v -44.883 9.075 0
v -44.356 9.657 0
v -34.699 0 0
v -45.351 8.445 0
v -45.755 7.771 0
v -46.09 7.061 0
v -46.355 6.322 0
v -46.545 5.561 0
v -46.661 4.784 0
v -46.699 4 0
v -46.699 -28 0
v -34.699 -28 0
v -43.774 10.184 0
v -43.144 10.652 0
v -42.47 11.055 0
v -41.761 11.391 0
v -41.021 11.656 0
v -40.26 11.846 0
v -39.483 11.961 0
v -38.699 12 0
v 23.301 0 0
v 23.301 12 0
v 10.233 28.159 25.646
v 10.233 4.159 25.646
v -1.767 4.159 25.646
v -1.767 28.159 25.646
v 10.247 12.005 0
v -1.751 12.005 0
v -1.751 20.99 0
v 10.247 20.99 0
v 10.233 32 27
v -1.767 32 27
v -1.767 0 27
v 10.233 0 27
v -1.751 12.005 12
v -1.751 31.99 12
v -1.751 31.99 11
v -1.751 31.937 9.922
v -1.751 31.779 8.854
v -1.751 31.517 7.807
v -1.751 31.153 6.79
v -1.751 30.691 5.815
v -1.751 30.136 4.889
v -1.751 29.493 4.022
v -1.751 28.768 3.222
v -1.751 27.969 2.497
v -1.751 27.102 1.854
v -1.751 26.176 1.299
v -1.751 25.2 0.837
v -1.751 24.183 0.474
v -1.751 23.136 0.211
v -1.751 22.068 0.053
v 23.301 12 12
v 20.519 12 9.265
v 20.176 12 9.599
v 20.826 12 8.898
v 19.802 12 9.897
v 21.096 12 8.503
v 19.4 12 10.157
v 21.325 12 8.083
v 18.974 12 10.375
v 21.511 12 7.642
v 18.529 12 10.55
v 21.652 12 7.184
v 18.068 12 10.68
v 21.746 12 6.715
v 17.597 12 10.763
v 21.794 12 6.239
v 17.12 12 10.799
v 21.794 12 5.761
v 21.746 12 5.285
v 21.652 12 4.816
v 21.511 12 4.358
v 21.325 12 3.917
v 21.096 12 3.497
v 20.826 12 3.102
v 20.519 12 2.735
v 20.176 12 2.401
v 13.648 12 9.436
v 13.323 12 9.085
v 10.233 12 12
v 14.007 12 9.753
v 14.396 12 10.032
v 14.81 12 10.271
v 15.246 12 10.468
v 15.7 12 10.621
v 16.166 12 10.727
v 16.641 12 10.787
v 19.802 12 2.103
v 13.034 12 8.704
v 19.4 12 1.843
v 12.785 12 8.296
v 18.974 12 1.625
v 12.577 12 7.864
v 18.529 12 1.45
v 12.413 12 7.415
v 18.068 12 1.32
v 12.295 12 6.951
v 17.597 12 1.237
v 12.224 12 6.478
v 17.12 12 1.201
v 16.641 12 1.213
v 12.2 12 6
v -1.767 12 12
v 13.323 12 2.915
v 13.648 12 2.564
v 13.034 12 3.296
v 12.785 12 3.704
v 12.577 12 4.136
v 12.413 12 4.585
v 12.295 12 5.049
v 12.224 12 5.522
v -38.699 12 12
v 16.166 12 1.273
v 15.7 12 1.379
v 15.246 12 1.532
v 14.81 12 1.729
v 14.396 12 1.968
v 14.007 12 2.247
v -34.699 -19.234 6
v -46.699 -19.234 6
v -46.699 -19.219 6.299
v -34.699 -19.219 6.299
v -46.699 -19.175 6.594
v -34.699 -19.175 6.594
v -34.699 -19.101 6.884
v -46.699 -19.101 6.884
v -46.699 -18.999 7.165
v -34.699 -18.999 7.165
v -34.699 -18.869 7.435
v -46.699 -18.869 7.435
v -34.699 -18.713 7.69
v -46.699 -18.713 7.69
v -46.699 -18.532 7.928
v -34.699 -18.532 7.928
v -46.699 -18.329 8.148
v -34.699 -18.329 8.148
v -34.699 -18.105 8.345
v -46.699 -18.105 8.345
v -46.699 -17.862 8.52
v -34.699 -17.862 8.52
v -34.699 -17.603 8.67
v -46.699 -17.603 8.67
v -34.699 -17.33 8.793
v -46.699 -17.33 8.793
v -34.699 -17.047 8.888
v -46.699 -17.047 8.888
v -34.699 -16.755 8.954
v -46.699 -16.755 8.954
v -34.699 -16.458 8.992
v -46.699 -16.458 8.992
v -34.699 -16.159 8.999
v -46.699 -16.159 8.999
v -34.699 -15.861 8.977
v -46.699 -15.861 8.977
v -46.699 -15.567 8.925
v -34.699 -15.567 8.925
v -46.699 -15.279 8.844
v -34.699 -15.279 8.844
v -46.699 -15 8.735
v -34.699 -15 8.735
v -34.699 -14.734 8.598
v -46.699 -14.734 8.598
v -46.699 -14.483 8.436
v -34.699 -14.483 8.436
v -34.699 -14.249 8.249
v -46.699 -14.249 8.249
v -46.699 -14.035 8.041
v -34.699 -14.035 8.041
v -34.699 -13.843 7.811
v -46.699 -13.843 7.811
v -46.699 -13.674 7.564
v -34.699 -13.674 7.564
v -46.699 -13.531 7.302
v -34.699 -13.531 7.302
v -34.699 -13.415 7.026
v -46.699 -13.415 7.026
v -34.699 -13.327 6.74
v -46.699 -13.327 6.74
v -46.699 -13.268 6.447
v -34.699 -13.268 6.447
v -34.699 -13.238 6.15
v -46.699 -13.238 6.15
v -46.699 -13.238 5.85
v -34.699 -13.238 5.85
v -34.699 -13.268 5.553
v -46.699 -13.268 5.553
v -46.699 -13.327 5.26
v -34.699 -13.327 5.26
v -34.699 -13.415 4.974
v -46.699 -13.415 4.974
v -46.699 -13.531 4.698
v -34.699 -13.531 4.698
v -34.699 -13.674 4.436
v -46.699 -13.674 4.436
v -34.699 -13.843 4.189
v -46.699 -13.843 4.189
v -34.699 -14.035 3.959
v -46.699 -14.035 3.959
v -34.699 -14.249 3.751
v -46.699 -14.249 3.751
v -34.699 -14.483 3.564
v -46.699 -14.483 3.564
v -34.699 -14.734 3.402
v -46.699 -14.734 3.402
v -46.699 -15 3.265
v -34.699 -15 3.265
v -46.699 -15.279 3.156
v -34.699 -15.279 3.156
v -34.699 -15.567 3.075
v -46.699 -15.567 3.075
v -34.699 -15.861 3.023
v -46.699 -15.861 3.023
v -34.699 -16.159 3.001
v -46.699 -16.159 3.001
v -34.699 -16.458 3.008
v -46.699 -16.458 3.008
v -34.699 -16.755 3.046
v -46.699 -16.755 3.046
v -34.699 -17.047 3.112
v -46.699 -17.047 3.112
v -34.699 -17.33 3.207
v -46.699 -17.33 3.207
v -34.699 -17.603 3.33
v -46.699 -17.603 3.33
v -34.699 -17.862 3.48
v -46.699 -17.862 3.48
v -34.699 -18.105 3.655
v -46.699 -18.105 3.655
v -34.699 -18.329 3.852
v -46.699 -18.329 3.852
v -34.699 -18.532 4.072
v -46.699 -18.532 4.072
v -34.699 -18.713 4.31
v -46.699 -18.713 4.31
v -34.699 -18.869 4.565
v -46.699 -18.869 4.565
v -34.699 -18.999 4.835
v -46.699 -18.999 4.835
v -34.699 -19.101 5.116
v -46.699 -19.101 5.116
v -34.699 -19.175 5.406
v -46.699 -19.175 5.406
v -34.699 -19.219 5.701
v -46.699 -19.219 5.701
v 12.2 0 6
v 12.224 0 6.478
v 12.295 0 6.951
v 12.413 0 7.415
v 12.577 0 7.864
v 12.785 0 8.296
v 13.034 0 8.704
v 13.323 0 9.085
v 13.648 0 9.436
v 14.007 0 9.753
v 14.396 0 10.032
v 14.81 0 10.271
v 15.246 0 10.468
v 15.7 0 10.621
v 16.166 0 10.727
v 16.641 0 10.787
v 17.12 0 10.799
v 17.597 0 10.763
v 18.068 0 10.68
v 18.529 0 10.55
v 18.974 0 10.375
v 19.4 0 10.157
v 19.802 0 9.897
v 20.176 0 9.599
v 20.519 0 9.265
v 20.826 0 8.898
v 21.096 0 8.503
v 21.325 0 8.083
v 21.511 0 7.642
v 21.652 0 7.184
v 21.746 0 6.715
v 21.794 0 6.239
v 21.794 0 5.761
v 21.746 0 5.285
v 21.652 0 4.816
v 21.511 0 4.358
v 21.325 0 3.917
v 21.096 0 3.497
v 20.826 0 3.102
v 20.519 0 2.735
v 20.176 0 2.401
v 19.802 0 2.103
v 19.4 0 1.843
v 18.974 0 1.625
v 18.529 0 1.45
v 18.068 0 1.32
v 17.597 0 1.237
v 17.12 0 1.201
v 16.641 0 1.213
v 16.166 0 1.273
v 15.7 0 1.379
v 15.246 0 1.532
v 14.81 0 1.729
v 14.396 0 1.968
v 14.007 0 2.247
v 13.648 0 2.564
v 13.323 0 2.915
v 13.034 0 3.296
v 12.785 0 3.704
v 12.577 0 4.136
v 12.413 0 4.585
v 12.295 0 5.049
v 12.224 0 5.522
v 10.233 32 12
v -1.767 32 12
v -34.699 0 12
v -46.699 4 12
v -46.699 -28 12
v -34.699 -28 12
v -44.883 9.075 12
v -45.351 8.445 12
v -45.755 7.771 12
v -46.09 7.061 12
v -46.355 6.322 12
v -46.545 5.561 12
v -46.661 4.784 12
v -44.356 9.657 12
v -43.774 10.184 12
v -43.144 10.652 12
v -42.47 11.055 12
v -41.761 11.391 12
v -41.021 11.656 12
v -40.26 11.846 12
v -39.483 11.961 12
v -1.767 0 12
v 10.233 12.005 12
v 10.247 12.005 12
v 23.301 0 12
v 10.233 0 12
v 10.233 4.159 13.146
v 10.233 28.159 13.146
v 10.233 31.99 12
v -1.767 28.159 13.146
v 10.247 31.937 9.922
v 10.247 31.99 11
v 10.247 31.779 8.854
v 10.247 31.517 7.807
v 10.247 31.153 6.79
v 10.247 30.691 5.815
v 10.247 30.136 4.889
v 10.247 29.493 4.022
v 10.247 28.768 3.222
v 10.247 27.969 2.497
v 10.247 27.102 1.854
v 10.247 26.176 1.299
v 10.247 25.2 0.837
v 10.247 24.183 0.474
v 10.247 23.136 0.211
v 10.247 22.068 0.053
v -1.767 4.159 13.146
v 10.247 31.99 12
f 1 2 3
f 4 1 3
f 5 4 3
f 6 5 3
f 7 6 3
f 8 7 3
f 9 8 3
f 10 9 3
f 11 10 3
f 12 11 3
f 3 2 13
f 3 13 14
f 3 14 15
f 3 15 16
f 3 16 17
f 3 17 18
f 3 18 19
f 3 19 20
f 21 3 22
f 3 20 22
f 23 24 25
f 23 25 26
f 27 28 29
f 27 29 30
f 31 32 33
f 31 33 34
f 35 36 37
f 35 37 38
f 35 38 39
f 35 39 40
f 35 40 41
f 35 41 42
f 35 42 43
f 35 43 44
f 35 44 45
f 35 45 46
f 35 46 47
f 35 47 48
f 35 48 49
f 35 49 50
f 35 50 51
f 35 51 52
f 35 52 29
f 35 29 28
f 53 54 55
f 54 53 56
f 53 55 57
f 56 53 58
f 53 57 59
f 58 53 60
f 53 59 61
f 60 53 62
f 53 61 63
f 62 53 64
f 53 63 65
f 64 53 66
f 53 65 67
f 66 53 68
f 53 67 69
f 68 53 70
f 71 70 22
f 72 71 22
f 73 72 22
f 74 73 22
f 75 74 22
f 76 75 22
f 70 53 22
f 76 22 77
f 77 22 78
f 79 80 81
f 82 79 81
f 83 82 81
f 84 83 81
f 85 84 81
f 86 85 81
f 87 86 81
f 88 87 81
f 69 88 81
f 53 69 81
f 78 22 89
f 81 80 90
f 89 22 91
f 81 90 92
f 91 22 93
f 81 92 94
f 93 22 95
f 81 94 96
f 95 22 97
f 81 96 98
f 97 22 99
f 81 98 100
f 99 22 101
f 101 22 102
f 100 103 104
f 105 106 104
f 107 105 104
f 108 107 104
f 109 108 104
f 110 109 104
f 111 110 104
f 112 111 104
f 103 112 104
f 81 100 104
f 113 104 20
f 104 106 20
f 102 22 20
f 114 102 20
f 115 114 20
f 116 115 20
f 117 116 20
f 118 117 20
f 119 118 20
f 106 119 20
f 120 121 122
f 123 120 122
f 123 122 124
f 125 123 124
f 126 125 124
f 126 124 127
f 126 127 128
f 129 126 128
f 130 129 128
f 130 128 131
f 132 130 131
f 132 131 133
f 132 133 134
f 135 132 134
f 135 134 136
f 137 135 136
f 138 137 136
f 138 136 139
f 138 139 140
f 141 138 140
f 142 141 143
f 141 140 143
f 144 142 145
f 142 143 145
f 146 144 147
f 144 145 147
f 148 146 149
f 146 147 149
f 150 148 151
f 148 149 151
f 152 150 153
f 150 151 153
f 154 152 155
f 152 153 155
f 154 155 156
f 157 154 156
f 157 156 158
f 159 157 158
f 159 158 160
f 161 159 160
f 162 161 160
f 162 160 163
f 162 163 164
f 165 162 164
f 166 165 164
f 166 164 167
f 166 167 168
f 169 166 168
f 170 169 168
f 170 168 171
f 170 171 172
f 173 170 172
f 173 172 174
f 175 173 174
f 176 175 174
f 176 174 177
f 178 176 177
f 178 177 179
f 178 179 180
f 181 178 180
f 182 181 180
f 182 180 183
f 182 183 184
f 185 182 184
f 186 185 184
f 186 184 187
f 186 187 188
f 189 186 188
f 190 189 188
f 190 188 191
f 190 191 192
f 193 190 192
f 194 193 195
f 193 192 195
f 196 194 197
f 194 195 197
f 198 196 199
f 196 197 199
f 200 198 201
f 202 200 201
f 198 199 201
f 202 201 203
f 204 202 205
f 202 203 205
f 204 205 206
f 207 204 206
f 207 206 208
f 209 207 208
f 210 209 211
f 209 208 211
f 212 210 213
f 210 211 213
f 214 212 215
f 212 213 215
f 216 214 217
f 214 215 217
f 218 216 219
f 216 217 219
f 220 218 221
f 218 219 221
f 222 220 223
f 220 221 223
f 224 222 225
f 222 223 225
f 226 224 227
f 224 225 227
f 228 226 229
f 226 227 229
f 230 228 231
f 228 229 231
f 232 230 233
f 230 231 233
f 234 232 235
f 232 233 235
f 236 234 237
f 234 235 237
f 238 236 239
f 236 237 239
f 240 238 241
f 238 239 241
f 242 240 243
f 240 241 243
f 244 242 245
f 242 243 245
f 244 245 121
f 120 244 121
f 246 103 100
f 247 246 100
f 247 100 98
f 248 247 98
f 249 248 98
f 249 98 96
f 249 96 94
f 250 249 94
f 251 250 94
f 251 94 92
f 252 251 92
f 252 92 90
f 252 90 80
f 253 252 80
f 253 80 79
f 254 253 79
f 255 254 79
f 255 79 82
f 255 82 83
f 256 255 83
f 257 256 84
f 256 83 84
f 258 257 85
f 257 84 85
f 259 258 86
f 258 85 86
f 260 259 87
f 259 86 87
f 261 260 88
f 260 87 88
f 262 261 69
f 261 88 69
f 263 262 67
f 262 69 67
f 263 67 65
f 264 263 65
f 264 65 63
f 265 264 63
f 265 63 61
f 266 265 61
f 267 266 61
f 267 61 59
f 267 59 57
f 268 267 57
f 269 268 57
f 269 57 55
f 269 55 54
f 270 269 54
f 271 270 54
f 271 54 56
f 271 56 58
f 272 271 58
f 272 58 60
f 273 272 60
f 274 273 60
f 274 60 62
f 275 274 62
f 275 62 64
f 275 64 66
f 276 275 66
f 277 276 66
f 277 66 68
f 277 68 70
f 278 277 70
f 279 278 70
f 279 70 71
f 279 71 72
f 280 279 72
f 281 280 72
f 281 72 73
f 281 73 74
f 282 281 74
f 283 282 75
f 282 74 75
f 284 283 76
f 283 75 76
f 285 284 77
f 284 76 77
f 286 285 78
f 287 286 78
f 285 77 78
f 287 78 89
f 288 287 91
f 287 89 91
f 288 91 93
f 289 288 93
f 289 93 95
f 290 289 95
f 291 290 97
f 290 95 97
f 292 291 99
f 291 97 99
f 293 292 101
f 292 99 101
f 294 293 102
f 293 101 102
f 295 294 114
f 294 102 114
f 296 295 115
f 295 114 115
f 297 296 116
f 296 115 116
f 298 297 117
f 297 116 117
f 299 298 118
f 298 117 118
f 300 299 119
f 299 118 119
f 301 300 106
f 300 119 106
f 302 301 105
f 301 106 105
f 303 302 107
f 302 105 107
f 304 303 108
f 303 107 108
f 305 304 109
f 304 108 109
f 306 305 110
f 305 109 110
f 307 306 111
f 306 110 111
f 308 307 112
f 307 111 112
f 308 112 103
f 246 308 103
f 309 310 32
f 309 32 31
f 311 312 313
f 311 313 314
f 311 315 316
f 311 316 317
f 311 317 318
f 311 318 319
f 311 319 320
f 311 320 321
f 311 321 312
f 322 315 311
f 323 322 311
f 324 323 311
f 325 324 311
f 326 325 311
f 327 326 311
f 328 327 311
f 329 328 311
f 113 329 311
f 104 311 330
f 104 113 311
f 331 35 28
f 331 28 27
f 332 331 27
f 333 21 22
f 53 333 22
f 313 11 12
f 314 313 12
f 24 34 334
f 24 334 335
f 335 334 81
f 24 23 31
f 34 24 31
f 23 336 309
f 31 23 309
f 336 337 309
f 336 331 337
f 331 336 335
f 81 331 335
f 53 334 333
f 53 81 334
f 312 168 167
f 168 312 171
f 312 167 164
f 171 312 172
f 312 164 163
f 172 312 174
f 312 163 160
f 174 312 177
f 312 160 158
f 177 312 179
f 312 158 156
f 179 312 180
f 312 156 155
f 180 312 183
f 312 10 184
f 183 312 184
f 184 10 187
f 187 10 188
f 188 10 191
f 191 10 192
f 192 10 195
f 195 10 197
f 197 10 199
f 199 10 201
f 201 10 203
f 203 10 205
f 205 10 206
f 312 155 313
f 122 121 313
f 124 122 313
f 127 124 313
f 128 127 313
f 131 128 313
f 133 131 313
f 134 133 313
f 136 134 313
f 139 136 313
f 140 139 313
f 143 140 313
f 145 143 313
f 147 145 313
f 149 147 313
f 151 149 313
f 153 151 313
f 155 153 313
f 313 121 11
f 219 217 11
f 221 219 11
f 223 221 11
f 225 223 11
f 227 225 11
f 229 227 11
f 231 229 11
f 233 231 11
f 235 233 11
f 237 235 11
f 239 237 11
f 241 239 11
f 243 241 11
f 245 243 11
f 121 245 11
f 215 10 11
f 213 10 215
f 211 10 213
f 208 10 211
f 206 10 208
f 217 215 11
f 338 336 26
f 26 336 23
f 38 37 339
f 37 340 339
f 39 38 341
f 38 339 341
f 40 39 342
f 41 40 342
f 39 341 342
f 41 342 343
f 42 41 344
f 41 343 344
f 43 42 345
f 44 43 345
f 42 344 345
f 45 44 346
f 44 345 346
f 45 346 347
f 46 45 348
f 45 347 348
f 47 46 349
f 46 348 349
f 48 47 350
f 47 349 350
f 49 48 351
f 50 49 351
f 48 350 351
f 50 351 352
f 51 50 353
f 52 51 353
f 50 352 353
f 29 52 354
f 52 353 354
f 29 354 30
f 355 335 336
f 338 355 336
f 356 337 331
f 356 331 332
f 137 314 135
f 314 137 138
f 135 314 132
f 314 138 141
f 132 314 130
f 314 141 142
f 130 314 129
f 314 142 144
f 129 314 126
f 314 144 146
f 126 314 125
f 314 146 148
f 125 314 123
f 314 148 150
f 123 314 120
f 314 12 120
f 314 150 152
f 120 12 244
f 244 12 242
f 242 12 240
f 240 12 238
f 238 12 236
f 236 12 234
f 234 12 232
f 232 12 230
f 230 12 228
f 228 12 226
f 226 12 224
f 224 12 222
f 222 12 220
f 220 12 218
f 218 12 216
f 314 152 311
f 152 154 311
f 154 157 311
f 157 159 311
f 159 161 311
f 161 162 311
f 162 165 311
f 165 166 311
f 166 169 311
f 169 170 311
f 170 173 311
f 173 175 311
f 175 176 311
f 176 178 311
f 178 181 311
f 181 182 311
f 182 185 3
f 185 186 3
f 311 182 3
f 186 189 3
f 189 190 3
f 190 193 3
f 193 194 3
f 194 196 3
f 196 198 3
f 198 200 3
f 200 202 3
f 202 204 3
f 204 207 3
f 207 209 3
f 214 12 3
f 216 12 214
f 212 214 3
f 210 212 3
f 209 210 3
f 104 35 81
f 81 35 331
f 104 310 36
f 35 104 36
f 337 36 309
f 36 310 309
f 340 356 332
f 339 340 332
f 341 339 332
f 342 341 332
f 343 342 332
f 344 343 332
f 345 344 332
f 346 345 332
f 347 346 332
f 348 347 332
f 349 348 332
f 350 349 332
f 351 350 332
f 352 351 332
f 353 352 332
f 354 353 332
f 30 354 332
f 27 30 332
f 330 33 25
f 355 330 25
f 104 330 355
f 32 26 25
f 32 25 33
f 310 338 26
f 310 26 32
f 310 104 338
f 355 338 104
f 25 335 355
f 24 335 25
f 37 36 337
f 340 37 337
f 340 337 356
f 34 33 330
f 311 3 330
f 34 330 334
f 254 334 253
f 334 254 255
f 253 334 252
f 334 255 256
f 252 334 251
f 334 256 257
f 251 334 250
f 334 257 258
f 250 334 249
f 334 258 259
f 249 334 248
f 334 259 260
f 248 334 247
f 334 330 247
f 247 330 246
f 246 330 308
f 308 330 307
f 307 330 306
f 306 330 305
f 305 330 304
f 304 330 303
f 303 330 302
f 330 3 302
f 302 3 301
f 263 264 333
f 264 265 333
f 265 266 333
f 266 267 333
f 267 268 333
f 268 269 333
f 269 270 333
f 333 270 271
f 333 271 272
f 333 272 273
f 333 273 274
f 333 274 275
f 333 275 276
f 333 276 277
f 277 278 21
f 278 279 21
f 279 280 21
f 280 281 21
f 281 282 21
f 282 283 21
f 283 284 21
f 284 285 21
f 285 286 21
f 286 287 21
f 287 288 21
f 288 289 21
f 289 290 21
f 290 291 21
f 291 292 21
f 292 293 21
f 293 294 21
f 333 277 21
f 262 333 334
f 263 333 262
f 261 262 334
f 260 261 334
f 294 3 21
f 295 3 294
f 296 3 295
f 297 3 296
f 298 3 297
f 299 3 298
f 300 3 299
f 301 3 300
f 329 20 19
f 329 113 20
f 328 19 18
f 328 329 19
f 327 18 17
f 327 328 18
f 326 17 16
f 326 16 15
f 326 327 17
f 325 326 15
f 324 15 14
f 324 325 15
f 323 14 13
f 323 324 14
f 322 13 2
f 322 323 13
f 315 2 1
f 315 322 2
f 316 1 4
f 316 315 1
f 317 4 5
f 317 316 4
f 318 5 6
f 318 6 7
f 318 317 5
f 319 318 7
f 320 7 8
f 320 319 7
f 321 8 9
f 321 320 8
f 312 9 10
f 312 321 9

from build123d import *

# Parameters (mm, degrees)
PAD_DEPTH       = 12
SKETCH001_R     = 4.8
POCKET_DEPTH    = 13
SKETCH006_W     = 12
SKETCH006_H     = 32
PAD001_DEPTH    = 15
SKETCH007_W     = 24
SKETCH007_H     = 12.5
POCKET004_DEPTH = 13
SKETCH008_R     = 3
POCKET005_DEPTH = 13
SKETCH009_W     = 11.997705
SKETCH009_H     = 19.984946
PAD002_DEPTH    = 12
FILLET_R        = 11
FILLET001_R     = 8


with BuildPart() as part:
    # Sketch → Pad (new body)
    with BuildSketch(Plane.XY):
        Polygon((0, 0), (23.300841, 0), (23.300841, 12), (-46.699159, 12), (-46.699159, -28), (-34.699159, -28), (-34.699159, 0), align=None)
    extrude(amount=PAD_DEPTH)

    # Sketch001 (on Face3 of Pad) → Pocket (cut)
    with BuildSketch(Plane(origin=(0, 12, 0), x_dir=(-1, 0, 0), z_dir=(0, 1, 0))):
        with Locations((-17, 6)):
            Circle(SKETCH001_R)
    extrude(amount=-POCKET_DEPTH, mode=Mode.SUBTRACT)

    # Sketch006 → Pad001 (join)
    with BuildSketch(Plane.XY.offset(12)):
        with Locations((4.232911, 16)):
            Rectangle(SKETCH006_W, SKETCH006_H)
    extrude(amount=PAD001_DEPTH)

    # Sketch007 (on Face19 of Pad001) → Pocket004 (cut)
    with BuildSketch(Plane.YZ.offset(10.232911)):
        with Locations((16.158846, 19.395833)):
            Rectangle(SKETCH007_W, SKETCH007_H)
    extrude(amount=-POCKET004_DEPTH, mode=Mode.SUBTRACT)

    # Sketch008 (on Face5 of Pocket004) → Pocket005 (cut)
    with BuildSketch(Plane(origin=(-46.699159, 0, 0), x_dir=(0, -1, 0), z_dir=(-1, 0, 0))):
        with Locations((16.234238, 6)):
            Circle(SKETCH008_R)
    extrude(amount=-POCKET005_DEPTH, mode=Mode.SUBTRACT)

    # Sketch009 (on Face12 of Pocket005) → Pad002 (join)
    with BuildSketch(Plane(origin=(0, 0, 12), x_dir=(1, 0, 0), z_dir=(0, 0, -1))):
        with Locations((4.247853, -21.997832)):
            Rectangle(SKETCH009_W, SKETCH009_H)
    extrude(amount=PAD002_DEPTH)

    # Fillet
    fillet_edges = [part.edges().sort_by_distance(p)[0] for p in [
        (4.247853, 31.990305, 0),
    ]]
    fillet(fillet_edges, radius=FILLET_R)

    # Fillet001
    fillet001_edges = [part.edges().sort_by_distance(p)[0] for p in [
        (-46.699159, 12, 6),
    ]]
    fillet(fillet001_edges, radius=FILLET001_R)


solid = part.part
